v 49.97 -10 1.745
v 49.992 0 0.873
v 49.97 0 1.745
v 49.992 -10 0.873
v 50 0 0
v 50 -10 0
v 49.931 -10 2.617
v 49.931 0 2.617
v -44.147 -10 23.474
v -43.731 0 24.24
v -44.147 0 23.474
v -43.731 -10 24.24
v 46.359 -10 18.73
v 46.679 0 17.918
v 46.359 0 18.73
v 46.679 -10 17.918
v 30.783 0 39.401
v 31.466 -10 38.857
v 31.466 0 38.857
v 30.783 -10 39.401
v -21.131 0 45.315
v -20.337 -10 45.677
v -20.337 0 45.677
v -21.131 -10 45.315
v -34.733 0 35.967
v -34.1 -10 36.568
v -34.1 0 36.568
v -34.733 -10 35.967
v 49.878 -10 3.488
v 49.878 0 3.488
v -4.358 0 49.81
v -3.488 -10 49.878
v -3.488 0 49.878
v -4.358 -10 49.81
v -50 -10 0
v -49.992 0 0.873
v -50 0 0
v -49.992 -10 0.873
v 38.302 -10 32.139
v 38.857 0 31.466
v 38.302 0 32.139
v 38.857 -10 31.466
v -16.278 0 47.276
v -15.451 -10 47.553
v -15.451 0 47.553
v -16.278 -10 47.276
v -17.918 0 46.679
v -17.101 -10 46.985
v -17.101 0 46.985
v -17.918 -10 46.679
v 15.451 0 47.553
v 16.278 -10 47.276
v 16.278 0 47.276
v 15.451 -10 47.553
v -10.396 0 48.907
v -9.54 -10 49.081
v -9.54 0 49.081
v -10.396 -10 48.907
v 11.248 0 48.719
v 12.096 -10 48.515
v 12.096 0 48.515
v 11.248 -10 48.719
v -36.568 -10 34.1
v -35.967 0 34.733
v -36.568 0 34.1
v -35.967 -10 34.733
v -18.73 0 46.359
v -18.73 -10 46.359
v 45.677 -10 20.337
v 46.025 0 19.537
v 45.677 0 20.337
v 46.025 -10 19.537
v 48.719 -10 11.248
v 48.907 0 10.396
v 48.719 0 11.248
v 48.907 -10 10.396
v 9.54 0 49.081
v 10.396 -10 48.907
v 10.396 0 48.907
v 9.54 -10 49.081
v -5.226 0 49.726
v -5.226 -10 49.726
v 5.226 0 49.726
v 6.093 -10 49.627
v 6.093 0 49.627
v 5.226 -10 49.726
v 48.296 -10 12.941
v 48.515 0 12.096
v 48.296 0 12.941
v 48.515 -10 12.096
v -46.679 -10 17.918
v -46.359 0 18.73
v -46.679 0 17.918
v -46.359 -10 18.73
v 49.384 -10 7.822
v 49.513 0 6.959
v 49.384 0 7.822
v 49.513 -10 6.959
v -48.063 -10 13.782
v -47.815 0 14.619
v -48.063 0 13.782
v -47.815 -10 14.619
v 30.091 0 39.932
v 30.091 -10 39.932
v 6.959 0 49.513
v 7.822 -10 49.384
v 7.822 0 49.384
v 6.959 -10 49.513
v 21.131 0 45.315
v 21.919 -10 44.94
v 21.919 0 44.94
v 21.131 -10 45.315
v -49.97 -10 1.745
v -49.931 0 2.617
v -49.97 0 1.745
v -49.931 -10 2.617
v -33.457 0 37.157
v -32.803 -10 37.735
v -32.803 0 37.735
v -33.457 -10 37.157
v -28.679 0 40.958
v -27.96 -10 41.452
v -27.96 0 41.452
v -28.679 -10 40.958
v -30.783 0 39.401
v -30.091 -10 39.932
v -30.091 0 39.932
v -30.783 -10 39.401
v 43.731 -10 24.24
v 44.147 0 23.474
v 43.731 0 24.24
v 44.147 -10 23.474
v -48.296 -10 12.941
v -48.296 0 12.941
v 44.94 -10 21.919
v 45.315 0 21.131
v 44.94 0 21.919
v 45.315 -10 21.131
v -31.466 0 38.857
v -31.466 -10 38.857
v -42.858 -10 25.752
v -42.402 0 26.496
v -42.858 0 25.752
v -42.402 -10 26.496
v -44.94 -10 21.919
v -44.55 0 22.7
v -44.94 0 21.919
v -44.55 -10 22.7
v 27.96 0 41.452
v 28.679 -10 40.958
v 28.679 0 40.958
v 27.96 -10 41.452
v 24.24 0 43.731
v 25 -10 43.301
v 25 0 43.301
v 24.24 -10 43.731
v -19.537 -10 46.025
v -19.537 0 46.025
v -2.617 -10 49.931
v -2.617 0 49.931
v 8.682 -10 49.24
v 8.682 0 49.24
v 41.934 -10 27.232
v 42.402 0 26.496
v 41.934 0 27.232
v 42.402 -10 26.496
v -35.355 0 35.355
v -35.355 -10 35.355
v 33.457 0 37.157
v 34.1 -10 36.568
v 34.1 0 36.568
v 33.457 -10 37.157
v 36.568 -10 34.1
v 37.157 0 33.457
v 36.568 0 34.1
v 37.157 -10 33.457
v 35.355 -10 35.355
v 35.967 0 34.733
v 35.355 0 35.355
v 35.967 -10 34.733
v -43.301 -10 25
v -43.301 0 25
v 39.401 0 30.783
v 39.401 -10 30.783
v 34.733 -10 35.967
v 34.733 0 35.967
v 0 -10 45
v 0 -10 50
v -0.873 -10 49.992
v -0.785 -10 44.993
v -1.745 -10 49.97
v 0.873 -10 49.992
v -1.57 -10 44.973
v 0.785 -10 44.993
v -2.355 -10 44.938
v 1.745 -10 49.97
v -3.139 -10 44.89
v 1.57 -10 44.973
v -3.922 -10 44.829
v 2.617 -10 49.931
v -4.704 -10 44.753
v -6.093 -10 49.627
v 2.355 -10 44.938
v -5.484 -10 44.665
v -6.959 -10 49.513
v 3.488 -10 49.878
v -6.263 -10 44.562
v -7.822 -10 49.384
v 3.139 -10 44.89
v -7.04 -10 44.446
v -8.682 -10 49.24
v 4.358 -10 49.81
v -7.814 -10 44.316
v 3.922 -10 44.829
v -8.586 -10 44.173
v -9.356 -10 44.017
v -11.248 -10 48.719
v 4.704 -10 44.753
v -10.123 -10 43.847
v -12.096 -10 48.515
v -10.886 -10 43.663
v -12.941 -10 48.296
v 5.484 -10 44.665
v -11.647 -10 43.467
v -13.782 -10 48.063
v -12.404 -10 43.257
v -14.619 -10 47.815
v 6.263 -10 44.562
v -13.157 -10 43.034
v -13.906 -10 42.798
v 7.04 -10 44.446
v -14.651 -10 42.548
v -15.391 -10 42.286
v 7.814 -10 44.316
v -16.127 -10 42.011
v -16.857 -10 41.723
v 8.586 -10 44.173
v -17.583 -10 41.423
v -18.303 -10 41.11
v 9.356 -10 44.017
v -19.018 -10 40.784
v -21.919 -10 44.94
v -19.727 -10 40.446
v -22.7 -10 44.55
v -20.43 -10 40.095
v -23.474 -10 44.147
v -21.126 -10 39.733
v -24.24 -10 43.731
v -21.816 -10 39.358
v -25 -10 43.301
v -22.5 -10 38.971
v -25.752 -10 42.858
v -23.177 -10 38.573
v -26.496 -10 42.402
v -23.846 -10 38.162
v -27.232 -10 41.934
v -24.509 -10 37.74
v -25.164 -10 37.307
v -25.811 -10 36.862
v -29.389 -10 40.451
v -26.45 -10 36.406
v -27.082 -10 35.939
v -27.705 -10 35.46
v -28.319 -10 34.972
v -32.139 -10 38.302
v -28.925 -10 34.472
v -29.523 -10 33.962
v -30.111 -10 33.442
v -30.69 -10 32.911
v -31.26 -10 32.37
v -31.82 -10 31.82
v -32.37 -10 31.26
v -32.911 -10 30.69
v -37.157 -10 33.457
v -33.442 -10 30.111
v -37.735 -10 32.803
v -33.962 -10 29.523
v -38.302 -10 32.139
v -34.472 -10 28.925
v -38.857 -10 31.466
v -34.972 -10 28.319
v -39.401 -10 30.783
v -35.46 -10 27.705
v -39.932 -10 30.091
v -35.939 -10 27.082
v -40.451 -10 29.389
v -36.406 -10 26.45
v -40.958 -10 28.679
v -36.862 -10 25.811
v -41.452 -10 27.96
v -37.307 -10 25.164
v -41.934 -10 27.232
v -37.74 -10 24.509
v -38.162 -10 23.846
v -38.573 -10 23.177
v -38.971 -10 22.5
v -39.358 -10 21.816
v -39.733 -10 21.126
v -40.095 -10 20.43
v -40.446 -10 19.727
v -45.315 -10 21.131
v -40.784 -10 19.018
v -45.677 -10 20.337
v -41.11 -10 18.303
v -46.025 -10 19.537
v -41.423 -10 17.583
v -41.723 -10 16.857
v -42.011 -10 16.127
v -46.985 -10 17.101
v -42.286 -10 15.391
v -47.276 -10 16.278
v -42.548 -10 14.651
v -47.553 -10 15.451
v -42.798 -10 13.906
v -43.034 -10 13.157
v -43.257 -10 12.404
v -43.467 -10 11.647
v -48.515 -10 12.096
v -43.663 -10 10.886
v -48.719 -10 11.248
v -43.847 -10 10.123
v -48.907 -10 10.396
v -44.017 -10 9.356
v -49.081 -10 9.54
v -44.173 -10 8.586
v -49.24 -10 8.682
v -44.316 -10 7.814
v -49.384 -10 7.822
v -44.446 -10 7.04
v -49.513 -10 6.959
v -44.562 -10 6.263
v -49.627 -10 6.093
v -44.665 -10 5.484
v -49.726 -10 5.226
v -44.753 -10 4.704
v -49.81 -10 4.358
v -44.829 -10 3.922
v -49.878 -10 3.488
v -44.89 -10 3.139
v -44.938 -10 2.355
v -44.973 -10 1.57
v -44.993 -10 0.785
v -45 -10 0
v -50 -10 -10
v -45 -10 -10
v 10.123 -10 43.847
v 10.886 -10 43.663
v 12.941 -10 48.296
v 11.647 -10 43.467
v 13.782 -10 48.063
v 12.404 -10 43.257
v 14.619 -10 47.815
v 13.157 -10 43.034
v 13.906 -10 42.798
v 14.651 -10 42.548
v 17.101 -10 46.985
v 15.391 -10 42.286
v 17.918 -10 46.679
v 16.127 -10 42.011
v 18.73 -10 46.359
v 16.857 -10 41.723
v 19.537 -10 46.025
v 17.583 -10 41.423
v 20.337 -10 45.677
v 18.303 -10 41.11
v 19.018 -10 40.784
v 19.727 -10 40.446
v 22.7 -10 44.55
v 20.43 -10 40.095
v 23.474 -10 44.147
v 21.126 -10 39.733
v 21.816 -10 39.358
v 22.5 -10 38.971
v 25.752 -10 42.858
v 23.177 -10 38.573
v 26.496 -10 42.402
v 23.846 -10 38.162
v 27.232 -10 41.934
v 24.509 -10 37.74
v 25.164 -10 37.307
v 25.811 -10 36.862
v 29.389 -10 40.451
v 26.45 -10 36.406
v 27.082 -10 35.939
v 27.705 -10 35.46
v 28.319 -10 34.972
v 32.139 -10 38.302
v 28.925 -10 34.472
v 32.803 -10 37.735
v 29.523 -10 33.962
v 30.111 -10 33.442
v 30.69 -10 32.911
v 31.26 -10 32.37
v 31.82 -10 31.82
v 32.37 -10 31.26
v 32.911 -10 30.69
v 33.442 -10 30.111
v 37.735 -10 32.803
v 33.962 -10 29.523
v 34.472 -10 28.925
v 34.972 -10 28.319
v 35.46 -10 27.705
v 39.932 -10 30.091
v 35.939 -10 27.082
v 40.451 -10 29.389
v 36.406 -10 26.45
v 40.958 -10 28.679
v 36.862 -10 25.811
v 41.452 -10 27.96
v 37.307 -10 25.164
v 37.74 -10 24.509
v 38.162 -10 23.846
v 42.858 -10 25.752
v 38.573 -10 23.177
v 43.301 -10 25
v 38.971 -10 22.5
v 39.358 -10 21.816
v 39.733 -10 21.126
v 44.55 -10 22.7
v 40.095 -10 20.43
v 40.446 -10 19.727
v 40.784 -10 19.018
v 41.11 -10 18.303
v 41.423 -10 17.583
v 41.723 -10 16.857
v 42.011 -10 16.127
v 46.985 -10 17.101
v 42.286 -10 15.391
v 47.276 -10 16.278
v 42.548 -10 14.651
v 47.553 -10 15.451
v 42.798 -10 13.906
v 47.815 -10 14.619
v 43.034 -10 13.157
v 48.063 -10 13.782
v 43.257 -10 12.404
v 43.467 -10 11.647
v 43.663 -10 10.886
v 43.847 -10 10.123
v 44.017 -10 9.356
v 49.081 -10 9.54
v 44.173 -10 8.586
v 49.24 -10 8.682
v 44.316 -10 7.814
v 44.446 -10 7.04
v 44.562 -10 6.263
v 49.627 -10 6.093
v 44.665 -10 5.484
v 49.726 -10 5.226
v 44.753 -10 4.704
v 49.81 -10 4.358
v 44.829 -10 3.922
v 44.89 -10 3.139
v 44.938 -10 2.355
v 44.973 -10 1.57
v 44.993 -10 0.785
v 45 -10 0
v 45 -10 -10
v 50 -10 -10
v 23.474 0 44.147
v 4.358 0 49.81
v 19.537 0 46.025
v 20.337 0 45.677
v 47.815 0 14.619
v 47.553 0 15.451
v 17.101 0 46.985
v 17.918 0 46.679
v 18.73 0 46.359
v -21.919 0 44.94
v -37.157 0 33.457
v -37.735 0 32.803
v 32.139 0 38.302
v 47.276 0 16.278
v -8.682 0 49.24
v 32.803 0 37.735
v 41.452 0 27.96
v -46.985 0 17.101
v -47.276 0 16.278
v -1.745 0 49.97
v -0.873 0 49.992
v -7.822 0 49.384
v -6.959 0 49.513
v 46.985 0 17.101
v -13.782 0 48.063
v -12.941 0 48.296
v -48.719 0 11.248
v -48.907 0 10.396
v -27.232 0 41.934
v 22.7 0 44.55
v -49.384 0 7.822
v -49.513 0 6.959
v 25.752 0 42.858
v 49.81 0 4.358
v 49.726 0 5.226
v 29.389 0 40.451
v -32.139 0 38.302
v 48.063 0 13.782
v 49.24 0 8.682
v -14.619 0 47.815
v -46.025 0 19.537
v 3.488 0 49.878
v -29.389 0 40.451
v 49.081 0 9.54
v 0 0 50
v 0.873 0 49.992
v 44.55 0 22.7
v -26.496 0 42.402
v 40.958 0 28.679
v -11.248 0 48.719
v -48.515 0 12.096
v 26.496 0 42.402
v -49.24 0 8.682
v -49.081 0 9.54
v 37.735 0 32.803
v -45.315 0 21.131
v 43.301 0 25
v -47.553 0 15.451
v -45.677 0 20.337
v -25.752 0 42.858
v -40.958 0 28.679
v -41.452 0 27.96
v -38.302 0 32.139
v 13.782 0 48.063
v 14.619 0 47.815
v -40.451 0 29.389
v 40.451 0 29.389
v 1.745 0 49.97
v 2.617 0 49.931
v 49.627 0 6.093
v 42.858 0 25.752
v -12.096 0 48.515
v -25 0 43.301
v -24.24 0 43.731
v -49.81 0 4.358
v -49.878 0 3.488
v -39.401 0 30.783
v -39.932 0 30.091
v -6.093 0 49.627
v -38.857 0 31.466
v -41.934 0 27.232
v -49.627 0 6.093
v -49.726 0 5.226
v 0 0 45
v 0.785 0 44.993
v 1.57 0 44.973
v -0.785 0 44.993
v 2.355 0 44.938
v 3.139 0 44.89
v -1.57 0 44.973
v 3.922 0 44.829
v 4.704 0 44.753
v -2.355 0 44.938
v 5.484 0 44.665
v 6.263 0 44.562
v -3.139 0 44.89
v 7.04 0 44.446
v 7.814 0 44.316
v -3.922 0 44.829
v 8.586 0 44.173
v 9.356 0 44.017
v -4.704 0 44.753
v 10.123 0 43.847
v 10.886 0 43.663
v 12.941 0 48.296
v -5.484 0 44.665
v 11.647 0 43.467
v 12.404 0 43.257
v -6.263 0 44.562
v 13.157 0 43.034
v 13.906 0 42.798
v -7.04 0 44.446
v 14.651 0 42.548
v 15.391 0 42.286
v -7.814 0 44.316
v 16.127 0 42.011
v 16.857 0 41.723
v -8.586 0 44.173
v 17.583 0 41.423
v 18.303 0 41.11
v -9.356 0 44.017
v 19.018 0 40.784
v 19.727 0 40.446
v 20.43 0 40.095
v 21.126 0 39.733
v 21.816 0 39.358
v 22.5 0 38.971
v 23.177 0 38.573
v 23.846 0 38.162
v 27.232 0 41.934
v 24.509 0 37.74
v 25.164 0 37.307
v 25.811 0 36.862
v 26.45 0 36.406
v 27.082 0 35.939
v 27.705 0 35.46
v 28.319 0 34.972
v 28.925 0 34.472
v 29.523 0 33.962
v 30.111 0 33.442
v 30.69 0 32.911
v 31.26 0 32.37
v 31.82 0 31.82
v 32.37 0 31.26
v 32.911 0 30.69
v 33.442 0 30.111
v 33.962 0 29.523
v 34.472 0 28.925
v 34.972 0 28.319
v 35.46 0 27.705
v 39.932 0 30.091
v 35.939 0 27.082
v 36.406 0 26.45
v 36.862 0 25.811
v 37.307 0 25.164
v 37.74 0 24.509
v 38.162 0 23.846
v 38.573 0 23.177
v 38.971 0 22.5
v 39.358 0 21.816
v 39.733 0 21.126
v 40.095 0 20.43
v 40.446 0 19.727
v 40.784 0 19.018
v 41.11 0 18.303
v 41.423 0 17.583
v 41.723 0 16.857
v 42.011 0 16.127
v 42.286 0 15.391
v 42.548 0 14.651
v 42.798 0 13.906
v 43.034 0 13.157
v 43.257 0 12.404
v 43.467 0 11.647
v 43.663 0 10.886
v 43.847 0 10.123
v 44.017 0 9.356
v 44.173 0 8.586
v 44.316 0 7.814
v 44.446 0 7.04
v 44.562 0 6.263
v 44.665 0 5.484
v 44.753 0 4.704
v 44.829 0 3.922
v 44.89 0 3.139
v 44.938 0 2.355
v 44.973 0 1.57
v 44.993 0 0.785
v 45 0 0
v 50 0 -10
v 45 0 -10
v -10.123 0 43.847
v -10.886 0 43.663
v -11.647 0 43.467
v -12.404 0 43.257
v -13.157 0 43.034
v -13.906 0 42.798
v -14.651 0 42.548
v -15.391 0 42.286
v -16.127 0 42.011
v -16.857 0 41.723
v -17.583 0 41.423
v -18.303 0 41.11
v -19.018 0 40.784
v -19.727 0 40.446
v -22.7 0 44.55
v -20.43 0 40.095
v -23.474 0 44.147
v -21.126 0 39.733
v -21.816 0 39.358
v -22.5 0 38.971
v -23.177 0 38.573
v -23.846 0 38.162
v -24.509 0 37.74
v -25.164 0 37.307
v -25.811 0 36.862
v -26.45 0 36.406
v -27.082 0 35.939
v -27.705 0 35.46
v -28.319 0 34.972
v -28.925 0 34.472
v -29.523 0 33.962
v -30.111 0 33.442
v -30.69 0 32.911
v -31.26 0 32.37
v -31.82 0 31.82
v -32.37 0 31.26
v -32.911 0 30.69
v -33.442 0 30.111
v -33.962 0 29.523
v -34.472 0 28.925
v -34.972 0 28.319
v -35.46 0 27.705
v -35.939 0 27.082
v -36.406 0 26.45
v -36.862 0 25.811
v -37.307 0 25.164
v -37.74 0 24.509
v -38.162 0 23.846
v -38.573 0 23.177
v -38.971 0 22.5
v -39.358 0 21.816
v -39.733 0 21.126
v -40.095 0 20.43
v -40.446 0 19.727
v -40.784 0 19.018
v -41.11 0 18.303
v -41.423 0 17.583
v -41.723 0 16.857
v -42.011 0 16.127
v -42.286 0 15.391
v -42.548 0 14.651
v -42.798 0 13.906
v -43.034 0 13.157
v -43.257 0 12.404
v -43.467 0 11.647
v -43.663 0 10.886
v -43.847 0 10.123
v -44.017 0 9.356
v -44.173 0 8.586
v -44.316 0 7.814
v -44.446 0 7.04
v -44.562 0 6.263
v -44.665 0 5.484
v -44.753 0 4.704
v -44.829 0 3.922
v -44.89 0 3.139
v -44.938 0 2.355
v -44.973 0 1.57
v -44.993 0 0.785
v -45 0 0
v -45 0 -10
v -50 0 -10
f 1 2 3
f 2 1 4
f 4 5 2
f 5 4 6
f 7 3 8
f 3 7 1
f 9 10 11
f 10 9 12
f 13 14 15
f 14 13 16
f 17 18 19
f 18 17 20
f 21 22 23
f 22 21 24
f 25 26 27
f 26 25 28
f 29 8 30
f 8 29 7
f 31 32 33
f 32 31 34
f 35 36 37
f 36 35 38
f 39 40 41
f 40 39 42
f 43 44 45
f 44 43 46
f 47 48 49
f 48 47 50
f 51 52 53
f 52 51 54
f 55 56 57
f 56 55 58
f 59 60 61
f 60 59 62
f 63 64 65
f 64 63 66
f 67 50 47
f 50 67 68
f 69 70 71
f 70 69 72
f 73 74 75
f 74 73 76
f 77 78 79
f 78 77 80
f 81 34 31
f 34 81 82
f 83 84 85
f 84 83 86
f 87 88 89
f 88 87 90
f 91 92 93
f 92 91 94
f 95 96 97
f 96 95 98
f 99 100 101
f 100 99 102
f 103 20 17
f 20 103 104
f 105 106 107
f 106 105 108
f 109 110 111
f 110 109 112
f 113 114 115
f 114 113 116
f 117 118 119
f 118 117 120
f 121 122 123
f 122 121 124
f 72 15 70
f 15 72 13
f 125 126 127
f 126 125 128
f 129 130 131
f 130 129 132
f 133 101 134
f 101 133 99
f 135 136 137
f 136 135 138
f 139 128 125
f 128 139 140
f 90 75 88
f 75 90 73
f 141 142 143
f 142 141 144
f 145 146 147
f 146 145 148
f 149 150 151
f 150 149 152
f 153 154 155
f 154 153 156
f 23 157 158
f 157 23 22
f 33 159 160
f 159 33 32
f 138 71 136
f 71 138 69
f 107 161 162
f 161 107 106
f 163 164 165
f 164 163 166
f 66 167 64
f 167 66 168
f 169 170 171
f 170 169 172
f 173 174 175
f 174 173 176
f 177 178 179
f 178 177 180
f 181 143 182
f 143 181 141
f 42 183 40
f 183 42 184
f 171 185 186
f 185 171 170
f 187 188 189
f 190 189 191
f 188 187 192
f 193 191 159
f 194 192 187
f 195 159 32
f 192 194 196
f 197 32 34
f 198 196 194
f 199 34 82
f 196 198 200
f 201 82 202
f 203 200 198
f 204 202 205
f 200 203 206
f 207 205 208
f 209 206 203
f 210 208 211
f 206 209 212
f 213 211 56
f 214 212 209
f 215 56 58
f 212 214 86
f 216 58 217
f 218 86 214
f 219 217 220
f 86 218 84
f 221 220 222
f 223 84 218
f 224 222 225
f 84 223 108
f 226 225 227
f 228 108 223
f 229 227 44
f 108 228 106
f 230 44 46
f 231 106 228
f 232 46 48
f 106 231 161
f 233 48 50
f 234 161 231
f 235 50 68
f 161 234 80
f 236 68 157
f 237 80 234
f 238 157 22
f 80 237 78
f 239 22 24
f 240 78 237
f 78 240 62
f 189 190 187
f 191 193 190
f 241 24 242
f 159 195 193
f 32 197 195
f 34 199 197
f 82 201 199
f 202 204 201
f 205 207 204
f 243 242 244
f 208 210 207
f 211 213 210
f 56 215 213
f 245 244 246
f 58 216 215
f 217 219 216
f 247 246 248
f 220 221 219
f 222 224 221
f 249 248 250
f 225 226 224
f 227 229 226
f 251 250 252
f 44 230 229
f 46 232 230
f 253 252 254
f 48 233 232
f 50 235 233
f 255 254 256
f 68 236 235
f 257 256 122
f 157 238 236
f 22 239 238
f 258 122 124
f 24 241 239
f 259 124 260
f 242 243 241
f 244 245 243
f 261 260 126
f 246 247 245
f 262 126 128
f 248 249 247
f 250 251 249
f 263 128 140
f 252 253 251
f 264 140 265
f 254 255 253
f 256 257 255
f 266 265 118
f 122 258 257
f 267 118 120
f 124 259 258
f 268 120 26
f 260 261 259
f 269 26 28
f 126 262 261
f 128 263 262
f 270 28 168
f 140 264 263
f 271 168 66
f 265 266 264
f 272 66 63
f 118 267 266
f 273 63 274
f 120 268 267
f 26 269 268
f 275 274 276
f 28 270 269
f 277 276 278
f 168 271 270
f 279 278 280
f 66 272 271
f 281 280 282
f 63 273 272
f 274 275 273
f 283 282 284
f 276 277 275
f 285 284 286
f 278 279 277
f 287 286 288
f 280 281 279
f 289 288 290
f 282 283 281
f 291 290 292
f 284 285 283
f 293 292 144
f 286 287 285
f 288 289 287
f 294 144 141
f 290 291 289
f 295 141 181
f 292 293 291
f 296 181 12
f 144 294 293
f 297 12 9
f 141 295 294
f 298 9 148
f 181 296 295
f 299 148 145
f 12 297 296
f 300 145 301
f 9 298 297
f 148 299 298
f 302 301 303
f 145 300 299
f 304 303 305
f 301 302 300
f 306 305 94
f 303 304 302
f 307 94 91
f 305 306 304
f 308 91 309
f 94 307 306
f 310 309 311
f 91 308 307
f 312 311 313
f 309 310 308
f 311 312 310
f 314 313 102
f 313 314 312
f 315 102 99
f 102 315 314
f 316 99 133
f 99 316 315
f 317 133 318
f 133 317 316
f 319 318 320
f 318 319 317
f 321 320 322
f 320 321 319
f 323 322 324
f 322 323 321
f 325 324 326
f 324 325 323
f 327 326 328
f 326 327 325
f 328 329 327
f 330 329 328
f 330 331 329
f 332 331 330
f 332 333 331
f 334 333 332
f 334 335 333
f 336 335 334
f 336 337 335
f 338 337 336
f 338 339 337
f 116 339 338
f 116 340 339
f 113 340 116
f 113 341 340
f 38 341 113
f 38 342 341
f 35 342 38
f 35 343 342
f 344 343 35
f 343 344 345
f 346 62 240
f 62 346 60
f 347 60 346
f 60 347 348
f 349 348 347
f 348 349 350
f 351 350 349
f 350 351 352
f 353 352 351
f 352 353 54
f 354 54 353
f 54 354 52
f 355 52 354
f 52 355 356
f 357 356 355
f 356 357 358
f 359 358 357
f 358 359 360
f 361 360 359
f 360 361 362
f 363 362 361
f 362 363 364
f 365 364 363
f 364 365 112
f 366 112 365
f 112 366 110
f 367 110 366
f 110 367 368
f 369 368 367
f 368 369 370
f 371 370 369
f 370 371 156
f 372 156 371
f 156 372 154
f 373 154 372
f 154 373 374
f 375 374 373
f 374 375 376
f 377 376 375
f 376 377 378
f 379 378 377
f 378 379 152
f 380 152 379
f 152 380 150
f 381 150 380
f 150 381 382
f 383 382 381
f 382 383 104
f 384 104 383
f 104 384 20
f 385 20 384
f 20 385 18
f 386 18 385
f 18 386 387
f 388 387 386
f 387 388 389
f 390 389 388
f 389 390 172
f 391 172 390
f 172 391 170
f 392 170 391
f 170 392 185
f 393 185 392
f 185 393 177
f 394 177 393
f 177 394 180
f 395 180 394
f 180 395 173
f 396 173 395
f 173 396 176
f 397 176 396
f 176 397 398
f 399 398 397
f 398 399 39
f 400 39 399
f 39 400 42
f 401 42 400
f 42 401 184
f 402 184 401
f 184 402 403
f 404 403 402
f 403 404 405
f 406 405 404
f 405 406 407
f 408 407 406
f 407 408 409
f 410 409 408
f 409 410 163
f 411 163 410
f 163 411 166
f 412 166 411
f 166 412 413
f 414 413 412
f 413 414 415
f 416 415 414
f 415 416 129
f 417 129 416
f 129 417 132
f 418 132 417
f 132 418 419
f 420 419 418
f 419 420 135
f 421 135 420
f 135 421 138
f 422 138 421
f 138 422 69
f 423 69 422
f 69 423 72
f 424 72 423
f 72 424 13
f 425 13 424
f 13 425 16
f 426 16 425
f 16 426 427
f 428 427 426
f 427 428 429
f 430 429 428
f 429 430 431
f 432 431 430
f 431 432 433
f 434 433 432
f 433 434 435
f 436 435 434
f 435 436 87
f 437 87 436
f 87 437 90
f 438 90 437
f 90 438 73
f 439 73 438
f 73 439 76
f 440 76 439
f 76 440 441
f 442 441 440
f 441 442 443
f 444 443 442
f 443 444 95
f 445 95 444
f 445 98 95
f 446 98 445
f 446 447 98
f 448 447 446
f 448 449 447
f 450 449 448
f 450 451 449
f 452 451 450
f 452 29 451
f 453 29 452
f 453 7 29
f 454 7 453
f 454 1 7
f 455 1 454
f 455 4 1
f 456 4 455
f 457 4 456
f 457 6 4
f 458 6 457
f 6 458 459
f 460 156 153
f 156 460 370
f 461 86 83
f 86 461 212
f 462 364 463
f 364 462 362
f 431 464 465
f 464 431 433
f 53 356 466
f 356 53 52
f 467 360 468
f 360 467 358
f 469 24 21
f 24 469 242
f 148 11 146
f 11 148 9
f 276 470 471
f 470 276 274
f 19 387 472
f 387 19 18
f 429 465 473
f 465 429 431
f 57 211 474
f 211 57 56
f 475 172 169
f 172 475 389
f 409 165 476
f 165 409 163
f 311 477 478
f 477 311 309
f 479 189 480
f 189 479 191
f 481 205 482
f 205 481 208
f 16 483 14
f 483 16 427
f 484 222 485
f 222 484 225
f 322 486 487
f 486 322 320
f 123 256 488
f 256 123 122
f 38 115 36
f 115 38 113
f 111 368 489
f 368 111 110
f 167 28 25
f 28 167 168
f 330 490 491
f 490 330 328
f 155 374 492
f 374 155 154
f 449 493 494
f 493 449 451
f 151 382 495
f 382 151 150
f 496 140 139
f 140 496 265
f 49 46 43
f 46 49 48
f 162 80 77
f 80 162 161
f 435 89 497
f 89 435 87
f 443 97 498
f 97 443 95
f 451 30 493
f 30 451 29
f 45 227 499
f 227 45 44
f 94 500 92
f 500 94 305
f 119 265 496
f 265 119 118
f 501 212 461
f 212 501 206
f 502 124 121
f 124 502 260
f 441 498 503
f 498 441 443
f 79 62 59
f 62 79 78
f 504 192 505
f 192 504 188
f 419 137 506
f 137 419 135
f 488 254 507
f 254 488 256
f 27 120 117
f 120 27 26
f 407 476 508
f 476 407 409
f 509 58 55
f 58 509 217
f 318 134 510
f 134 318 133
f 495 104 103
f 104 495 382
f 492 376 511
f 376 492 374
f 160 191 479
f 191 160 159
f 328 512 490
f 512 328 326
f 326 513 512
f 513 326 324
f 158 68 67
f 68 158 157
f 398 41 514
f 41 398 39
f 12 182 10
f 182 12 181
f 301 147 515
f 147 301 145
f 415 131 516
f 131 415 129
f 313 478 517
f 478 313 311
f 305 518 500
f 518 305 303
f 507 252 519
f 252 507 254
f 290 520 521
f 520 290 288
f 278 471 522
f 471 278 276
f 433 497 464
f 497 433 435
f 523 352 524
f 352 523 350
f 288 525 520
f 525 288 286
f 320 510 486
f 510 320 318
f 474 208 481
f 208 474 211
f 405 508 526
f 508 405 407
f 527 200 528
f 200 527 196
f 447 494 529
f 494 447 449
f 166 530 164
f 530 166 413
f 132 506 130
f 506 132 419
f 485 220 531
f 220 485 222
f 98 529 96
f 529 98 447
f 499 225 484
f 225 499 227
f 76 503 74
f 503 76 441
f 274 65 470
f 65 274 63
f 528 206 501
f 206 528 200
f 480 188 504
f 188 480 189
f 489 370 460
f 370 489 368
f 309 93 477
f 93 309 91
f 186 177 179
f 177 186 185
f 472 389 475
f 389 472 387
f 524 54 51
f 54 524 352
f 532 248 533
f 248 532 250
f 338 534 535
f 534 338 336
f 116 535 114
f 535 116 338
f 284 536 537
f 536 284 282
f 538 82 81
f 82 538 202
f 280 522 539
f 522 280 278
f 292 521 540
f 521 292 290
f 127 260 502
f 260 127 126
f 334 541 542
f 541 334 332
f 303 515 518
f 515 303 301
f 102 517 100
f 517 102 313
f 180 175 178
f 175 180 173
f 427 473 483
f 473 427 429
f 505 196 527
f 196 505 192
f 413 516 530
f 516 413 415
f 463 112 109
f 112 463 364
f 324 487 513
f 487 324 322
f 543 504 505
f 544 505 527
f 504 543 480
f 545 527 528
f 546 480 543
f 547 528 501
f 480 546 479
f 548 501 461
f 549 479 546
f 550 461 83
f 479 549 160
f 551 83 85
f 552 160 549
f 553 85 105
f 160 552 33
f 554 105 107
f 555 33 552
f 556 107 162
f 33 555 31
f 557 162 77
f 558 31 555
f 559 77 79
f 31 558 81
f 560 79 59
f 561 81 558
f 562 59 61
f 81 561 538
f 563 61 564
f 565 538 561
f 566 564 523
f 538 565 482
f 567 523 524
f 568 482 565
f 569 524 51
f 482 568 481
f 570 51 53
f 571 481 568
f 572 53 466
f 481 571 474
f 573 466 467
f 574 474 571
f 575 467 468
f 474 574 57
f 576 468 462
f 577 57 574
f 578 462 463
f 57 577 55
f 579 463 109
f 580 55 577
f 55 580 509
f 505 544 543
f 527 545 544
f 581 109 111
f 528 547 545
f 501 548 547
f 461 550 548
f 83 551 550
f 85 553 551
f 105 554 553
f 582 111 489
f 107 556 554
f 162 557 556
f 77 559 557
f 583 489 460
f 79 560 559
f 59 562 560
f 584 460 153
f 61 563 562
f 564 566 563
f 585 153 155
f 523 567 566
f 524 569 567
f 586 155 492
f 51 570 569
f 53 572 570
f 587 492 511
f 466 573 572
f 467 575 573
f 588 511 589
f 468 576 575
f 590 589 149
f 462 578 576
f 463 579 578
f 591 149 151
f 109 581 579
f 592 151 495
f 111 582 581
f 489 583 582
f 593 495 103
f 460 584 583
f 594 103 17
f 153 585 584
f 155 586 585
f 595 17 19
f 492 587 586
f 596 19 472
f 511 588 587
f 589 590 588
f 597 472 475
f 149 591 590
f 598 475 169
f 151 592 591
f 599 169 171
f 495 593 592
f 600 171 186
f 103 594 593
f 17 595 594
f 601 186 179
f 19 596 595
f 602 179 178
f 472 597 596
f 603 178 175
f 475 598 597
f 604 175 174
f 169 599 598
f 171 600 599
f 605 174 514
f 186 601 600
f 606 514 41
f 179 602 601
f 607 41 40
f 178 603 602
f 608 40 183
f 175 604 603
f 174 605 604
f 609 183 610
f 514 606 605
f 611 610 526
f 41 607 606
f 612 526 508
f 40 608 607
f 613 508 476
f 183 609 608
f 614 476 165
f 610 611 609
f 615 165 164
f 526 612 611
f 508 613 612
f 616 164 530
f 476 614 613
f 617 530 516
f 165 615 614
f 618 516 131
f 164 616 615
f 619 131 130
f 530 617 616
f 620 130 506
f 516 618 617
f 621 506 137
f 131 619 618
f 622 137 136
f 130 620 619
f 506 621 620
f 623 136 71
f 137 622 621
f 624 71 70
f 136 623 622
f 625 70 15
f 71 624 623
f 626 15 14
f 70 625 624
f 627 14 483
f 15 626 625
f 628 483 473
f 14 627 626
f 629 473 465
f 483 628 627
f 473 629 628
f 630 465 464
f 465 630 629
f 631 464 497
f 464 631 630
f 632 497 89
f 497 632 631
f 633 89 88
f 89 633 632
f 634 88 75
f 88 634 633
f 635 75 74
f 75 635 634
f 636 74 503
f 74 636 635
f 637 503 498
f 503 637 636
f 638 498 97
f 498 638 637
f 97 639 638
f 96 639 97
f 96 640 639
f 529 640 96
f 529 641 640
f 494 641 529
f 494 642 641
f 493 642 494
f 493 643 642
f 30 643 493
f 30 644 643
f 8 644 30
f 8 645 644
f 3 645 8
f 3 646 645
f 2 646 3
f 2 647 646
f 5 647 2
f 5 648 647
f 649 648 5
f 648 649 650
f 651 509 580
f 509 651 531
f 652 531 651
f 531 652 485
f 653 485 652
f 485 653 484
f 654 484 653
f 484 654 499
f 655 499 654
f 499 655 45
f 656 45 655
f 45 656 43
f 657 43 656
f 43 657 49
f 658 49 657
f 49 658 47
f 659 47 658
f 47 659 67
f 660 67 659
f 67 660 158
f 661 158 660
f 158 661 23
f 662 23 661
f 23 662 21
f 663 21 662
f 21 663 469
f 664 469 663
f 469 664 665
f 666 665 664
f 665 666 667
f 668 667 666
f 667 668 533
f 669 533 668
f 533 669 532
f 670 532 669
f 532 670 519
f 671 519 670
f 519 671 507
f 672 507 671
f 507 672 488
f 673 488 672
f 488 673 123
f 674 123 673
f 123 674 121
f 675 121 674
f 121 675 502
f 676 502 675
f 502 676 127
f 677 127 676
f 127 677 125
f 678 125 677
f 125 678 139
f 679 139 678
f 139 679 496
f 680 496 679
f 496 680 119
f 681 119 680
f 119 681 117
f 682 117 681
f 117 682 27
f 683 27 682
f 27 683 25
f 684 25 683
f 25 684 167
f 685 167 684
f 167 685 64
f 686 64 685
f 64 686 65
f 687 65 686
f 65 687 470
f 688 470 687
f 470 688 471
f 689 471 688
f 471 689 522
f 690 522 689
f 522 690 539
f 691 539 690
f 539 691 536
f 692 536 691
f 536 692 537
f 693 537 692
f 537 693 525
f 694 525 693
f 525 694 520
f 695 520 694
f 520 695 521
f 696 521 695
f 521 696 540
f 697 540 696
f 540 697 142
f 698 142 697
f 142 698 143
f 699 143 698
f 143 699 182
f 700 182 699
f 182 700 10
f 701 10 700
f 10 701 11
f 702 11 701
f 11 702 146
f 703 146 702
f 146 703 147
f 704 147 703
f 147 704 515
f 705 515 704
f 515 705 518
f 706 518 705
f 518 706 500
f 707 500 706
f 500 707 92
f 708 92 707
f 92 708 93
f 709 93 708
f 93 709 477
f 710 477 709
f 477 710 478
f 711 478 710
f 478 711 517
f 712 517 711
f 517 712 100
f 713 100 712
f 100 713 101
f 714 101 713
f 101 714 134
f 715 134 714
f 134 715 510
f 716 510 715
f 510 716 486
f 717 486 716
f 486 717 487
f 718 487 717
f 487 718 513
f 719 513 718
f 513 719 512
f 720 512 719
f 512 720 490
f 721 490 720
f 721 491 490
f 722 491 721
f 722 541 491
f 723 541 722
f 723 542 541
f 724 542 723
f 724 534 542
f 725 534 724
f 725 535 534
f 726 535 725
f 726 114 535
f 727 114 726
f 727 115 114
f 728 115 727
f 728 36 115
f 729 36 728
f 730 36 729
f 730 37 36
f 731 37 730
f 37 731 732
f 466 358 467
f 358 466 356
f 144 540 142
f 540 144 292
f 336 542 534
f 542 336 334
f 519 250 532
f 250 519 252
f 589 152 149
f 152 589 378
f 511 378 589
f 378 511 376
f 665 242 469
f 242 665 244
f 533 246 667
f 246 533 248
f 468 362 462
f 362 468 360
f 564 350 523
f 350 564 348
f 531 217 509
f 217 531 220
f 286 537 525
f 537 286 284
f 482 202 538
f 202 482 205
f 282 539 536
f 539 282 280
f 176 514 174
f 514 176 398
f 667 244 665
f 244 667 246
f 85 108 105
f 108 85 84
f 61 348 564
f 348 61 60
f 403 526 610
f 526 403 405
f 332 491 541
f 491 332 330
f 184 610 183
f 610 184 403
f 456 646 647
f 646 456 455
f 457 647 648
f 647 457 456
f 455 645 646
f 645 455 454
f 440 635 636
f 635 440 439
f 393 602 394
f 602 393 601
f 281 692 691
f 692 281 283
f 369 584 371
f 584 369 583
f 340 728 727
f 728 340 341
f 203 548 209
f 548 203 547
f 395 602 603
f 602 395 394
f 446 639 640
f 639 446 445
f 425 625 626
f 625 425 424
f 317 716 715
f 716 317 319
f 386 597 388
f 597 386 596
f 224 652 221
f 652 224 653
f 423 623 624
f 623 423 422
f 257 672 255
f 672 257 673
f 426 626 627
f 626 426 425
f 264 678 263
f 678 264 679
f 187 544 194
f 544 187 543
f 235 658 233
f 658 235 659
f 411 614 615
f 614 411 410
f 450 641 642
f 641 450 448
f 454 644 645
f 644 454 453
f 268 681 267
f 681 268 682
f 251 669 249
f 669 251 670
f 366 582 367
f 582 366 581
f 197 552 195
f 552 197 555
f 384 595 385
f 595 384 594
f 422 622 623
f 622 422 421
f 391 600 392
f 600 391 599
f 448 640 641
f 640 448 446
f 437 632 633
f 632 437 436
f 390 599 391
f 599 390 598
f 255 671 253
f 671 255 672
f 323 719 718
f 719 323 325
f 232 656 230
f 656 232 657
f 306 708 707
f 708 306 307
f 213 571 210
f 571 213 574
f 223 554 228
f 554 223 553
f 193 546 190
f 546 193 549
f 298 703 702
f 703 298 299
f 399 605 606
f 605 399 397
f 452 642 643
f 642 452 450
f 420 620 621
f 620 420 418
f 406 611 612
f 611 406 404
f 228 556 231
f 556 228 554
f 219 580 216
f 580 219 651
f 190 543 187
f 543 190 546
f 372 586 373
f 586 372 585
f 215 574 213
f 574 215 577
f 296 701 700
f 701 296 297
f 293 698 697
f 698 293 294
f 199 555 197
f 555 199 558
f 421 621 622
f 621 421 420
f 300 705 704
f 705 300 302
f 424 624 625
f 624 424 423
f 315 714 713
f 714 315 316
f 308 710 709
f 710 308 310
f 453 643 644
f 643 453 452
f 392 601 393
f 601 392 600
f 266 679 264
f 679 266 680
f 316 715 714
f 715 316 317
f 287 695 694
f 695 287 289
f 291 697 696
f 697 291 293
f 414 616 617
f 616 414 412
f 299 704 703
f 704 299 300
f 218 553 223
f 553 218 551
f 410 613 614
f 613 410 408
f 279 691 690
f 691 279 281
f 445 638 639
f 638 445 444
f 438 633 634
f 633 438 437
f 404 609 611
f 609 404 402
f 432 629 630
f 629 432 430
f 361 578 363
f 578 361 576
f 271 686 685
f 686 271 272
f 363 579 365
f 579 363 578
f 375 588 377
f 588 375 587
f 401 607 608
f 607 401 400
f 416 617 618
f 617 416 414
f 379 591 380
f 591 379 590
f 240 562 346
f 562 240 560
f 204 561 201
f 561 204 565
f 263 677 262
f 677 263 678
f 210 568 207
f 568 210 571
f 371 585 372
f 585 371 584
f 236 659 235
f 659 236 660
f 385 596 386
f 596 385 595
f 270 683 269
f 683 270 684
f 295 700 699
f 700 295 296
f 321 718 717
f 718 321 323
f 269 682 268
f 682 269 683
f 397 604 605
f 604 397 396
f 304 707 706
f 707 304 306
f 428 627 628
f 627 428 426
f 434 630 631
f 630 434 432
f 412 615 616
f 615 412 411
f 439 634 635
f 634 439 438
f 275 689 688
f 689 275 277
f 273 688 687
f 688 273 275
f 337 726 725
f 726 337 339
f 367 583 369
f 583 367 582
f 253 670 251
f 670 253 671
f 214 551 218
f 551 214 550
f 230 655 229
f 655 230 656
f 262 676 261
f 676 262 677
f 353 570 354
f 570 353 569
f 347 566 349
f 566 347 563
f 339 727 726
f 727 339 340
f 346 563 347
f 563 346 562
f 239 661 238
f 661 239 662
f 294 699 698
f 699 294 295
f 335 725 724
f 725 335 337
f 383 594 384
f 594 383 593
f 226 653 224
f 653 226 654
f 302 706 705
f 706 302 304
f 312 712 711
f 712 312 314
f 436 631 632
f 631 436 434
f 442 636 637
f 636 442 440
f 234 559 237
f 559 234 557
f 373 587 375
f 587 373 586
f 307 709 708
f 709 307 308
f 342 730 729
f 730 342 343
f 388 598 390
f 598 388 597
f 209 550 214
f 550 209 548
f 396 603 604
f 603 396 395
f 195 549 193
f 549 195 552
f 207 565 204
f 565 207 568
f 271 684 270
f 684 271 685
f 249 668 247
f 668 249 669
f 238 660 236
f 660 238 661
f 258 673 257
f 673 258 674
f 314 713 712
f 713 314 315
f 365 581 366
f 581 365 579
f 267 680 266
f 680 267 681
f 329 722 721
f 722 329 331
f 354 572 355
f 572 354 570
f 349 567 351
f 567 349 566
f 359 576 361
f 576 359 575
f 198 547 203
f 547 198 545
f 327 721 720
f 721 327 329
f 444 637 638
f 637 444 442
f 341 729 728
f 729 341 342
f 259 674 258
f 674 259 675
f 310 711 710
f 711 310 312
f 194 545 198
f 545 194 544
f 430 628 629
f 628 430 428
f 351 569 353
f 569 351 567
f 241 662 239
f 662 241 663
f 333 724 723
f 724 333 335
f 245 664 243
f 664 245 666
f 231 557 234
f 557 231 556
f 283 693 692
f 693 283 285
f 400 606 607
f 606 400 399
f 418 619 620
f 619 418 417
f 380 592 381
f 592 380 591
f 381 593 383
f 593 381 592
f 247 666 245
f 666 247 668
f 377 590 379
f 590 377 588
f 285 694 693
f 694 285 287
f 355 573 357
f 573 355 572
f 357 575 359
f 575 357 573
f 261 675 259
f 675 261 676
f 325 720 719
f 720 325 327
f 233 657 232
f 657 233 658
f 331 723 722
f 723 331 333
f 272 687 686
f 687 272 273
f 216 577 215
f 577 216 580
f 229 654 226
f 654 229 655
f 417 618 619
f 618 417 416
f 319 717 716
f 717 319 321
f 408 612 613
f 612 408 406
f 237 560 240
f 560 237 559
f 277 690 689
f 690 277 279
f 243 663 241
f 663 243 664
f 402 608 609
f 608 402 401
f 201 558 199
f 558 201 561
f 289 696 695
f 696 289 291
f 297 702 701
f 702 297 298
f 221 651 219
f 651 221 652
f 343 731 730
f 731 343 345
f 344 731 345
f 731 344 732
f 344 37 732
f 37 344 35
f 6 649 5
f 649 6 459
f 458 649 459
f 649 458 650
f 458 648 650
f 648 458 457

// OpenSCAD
rotate([90, 0, 0]) {
	difference() {
		cylinder(h=10, r=50, $fn=360);
		translate([0, 0, -1])
			cylinder(h=12, r=45, $fn=360);
		translate([-50, -50, -1])
			cube([100, 50, 12]);
	}
}
translate([-50, -10, -10]) {
	cube([5, 10, 10]);
}
translate([45, -10, -10]) {
	cube([5, 10, 10]);
}
